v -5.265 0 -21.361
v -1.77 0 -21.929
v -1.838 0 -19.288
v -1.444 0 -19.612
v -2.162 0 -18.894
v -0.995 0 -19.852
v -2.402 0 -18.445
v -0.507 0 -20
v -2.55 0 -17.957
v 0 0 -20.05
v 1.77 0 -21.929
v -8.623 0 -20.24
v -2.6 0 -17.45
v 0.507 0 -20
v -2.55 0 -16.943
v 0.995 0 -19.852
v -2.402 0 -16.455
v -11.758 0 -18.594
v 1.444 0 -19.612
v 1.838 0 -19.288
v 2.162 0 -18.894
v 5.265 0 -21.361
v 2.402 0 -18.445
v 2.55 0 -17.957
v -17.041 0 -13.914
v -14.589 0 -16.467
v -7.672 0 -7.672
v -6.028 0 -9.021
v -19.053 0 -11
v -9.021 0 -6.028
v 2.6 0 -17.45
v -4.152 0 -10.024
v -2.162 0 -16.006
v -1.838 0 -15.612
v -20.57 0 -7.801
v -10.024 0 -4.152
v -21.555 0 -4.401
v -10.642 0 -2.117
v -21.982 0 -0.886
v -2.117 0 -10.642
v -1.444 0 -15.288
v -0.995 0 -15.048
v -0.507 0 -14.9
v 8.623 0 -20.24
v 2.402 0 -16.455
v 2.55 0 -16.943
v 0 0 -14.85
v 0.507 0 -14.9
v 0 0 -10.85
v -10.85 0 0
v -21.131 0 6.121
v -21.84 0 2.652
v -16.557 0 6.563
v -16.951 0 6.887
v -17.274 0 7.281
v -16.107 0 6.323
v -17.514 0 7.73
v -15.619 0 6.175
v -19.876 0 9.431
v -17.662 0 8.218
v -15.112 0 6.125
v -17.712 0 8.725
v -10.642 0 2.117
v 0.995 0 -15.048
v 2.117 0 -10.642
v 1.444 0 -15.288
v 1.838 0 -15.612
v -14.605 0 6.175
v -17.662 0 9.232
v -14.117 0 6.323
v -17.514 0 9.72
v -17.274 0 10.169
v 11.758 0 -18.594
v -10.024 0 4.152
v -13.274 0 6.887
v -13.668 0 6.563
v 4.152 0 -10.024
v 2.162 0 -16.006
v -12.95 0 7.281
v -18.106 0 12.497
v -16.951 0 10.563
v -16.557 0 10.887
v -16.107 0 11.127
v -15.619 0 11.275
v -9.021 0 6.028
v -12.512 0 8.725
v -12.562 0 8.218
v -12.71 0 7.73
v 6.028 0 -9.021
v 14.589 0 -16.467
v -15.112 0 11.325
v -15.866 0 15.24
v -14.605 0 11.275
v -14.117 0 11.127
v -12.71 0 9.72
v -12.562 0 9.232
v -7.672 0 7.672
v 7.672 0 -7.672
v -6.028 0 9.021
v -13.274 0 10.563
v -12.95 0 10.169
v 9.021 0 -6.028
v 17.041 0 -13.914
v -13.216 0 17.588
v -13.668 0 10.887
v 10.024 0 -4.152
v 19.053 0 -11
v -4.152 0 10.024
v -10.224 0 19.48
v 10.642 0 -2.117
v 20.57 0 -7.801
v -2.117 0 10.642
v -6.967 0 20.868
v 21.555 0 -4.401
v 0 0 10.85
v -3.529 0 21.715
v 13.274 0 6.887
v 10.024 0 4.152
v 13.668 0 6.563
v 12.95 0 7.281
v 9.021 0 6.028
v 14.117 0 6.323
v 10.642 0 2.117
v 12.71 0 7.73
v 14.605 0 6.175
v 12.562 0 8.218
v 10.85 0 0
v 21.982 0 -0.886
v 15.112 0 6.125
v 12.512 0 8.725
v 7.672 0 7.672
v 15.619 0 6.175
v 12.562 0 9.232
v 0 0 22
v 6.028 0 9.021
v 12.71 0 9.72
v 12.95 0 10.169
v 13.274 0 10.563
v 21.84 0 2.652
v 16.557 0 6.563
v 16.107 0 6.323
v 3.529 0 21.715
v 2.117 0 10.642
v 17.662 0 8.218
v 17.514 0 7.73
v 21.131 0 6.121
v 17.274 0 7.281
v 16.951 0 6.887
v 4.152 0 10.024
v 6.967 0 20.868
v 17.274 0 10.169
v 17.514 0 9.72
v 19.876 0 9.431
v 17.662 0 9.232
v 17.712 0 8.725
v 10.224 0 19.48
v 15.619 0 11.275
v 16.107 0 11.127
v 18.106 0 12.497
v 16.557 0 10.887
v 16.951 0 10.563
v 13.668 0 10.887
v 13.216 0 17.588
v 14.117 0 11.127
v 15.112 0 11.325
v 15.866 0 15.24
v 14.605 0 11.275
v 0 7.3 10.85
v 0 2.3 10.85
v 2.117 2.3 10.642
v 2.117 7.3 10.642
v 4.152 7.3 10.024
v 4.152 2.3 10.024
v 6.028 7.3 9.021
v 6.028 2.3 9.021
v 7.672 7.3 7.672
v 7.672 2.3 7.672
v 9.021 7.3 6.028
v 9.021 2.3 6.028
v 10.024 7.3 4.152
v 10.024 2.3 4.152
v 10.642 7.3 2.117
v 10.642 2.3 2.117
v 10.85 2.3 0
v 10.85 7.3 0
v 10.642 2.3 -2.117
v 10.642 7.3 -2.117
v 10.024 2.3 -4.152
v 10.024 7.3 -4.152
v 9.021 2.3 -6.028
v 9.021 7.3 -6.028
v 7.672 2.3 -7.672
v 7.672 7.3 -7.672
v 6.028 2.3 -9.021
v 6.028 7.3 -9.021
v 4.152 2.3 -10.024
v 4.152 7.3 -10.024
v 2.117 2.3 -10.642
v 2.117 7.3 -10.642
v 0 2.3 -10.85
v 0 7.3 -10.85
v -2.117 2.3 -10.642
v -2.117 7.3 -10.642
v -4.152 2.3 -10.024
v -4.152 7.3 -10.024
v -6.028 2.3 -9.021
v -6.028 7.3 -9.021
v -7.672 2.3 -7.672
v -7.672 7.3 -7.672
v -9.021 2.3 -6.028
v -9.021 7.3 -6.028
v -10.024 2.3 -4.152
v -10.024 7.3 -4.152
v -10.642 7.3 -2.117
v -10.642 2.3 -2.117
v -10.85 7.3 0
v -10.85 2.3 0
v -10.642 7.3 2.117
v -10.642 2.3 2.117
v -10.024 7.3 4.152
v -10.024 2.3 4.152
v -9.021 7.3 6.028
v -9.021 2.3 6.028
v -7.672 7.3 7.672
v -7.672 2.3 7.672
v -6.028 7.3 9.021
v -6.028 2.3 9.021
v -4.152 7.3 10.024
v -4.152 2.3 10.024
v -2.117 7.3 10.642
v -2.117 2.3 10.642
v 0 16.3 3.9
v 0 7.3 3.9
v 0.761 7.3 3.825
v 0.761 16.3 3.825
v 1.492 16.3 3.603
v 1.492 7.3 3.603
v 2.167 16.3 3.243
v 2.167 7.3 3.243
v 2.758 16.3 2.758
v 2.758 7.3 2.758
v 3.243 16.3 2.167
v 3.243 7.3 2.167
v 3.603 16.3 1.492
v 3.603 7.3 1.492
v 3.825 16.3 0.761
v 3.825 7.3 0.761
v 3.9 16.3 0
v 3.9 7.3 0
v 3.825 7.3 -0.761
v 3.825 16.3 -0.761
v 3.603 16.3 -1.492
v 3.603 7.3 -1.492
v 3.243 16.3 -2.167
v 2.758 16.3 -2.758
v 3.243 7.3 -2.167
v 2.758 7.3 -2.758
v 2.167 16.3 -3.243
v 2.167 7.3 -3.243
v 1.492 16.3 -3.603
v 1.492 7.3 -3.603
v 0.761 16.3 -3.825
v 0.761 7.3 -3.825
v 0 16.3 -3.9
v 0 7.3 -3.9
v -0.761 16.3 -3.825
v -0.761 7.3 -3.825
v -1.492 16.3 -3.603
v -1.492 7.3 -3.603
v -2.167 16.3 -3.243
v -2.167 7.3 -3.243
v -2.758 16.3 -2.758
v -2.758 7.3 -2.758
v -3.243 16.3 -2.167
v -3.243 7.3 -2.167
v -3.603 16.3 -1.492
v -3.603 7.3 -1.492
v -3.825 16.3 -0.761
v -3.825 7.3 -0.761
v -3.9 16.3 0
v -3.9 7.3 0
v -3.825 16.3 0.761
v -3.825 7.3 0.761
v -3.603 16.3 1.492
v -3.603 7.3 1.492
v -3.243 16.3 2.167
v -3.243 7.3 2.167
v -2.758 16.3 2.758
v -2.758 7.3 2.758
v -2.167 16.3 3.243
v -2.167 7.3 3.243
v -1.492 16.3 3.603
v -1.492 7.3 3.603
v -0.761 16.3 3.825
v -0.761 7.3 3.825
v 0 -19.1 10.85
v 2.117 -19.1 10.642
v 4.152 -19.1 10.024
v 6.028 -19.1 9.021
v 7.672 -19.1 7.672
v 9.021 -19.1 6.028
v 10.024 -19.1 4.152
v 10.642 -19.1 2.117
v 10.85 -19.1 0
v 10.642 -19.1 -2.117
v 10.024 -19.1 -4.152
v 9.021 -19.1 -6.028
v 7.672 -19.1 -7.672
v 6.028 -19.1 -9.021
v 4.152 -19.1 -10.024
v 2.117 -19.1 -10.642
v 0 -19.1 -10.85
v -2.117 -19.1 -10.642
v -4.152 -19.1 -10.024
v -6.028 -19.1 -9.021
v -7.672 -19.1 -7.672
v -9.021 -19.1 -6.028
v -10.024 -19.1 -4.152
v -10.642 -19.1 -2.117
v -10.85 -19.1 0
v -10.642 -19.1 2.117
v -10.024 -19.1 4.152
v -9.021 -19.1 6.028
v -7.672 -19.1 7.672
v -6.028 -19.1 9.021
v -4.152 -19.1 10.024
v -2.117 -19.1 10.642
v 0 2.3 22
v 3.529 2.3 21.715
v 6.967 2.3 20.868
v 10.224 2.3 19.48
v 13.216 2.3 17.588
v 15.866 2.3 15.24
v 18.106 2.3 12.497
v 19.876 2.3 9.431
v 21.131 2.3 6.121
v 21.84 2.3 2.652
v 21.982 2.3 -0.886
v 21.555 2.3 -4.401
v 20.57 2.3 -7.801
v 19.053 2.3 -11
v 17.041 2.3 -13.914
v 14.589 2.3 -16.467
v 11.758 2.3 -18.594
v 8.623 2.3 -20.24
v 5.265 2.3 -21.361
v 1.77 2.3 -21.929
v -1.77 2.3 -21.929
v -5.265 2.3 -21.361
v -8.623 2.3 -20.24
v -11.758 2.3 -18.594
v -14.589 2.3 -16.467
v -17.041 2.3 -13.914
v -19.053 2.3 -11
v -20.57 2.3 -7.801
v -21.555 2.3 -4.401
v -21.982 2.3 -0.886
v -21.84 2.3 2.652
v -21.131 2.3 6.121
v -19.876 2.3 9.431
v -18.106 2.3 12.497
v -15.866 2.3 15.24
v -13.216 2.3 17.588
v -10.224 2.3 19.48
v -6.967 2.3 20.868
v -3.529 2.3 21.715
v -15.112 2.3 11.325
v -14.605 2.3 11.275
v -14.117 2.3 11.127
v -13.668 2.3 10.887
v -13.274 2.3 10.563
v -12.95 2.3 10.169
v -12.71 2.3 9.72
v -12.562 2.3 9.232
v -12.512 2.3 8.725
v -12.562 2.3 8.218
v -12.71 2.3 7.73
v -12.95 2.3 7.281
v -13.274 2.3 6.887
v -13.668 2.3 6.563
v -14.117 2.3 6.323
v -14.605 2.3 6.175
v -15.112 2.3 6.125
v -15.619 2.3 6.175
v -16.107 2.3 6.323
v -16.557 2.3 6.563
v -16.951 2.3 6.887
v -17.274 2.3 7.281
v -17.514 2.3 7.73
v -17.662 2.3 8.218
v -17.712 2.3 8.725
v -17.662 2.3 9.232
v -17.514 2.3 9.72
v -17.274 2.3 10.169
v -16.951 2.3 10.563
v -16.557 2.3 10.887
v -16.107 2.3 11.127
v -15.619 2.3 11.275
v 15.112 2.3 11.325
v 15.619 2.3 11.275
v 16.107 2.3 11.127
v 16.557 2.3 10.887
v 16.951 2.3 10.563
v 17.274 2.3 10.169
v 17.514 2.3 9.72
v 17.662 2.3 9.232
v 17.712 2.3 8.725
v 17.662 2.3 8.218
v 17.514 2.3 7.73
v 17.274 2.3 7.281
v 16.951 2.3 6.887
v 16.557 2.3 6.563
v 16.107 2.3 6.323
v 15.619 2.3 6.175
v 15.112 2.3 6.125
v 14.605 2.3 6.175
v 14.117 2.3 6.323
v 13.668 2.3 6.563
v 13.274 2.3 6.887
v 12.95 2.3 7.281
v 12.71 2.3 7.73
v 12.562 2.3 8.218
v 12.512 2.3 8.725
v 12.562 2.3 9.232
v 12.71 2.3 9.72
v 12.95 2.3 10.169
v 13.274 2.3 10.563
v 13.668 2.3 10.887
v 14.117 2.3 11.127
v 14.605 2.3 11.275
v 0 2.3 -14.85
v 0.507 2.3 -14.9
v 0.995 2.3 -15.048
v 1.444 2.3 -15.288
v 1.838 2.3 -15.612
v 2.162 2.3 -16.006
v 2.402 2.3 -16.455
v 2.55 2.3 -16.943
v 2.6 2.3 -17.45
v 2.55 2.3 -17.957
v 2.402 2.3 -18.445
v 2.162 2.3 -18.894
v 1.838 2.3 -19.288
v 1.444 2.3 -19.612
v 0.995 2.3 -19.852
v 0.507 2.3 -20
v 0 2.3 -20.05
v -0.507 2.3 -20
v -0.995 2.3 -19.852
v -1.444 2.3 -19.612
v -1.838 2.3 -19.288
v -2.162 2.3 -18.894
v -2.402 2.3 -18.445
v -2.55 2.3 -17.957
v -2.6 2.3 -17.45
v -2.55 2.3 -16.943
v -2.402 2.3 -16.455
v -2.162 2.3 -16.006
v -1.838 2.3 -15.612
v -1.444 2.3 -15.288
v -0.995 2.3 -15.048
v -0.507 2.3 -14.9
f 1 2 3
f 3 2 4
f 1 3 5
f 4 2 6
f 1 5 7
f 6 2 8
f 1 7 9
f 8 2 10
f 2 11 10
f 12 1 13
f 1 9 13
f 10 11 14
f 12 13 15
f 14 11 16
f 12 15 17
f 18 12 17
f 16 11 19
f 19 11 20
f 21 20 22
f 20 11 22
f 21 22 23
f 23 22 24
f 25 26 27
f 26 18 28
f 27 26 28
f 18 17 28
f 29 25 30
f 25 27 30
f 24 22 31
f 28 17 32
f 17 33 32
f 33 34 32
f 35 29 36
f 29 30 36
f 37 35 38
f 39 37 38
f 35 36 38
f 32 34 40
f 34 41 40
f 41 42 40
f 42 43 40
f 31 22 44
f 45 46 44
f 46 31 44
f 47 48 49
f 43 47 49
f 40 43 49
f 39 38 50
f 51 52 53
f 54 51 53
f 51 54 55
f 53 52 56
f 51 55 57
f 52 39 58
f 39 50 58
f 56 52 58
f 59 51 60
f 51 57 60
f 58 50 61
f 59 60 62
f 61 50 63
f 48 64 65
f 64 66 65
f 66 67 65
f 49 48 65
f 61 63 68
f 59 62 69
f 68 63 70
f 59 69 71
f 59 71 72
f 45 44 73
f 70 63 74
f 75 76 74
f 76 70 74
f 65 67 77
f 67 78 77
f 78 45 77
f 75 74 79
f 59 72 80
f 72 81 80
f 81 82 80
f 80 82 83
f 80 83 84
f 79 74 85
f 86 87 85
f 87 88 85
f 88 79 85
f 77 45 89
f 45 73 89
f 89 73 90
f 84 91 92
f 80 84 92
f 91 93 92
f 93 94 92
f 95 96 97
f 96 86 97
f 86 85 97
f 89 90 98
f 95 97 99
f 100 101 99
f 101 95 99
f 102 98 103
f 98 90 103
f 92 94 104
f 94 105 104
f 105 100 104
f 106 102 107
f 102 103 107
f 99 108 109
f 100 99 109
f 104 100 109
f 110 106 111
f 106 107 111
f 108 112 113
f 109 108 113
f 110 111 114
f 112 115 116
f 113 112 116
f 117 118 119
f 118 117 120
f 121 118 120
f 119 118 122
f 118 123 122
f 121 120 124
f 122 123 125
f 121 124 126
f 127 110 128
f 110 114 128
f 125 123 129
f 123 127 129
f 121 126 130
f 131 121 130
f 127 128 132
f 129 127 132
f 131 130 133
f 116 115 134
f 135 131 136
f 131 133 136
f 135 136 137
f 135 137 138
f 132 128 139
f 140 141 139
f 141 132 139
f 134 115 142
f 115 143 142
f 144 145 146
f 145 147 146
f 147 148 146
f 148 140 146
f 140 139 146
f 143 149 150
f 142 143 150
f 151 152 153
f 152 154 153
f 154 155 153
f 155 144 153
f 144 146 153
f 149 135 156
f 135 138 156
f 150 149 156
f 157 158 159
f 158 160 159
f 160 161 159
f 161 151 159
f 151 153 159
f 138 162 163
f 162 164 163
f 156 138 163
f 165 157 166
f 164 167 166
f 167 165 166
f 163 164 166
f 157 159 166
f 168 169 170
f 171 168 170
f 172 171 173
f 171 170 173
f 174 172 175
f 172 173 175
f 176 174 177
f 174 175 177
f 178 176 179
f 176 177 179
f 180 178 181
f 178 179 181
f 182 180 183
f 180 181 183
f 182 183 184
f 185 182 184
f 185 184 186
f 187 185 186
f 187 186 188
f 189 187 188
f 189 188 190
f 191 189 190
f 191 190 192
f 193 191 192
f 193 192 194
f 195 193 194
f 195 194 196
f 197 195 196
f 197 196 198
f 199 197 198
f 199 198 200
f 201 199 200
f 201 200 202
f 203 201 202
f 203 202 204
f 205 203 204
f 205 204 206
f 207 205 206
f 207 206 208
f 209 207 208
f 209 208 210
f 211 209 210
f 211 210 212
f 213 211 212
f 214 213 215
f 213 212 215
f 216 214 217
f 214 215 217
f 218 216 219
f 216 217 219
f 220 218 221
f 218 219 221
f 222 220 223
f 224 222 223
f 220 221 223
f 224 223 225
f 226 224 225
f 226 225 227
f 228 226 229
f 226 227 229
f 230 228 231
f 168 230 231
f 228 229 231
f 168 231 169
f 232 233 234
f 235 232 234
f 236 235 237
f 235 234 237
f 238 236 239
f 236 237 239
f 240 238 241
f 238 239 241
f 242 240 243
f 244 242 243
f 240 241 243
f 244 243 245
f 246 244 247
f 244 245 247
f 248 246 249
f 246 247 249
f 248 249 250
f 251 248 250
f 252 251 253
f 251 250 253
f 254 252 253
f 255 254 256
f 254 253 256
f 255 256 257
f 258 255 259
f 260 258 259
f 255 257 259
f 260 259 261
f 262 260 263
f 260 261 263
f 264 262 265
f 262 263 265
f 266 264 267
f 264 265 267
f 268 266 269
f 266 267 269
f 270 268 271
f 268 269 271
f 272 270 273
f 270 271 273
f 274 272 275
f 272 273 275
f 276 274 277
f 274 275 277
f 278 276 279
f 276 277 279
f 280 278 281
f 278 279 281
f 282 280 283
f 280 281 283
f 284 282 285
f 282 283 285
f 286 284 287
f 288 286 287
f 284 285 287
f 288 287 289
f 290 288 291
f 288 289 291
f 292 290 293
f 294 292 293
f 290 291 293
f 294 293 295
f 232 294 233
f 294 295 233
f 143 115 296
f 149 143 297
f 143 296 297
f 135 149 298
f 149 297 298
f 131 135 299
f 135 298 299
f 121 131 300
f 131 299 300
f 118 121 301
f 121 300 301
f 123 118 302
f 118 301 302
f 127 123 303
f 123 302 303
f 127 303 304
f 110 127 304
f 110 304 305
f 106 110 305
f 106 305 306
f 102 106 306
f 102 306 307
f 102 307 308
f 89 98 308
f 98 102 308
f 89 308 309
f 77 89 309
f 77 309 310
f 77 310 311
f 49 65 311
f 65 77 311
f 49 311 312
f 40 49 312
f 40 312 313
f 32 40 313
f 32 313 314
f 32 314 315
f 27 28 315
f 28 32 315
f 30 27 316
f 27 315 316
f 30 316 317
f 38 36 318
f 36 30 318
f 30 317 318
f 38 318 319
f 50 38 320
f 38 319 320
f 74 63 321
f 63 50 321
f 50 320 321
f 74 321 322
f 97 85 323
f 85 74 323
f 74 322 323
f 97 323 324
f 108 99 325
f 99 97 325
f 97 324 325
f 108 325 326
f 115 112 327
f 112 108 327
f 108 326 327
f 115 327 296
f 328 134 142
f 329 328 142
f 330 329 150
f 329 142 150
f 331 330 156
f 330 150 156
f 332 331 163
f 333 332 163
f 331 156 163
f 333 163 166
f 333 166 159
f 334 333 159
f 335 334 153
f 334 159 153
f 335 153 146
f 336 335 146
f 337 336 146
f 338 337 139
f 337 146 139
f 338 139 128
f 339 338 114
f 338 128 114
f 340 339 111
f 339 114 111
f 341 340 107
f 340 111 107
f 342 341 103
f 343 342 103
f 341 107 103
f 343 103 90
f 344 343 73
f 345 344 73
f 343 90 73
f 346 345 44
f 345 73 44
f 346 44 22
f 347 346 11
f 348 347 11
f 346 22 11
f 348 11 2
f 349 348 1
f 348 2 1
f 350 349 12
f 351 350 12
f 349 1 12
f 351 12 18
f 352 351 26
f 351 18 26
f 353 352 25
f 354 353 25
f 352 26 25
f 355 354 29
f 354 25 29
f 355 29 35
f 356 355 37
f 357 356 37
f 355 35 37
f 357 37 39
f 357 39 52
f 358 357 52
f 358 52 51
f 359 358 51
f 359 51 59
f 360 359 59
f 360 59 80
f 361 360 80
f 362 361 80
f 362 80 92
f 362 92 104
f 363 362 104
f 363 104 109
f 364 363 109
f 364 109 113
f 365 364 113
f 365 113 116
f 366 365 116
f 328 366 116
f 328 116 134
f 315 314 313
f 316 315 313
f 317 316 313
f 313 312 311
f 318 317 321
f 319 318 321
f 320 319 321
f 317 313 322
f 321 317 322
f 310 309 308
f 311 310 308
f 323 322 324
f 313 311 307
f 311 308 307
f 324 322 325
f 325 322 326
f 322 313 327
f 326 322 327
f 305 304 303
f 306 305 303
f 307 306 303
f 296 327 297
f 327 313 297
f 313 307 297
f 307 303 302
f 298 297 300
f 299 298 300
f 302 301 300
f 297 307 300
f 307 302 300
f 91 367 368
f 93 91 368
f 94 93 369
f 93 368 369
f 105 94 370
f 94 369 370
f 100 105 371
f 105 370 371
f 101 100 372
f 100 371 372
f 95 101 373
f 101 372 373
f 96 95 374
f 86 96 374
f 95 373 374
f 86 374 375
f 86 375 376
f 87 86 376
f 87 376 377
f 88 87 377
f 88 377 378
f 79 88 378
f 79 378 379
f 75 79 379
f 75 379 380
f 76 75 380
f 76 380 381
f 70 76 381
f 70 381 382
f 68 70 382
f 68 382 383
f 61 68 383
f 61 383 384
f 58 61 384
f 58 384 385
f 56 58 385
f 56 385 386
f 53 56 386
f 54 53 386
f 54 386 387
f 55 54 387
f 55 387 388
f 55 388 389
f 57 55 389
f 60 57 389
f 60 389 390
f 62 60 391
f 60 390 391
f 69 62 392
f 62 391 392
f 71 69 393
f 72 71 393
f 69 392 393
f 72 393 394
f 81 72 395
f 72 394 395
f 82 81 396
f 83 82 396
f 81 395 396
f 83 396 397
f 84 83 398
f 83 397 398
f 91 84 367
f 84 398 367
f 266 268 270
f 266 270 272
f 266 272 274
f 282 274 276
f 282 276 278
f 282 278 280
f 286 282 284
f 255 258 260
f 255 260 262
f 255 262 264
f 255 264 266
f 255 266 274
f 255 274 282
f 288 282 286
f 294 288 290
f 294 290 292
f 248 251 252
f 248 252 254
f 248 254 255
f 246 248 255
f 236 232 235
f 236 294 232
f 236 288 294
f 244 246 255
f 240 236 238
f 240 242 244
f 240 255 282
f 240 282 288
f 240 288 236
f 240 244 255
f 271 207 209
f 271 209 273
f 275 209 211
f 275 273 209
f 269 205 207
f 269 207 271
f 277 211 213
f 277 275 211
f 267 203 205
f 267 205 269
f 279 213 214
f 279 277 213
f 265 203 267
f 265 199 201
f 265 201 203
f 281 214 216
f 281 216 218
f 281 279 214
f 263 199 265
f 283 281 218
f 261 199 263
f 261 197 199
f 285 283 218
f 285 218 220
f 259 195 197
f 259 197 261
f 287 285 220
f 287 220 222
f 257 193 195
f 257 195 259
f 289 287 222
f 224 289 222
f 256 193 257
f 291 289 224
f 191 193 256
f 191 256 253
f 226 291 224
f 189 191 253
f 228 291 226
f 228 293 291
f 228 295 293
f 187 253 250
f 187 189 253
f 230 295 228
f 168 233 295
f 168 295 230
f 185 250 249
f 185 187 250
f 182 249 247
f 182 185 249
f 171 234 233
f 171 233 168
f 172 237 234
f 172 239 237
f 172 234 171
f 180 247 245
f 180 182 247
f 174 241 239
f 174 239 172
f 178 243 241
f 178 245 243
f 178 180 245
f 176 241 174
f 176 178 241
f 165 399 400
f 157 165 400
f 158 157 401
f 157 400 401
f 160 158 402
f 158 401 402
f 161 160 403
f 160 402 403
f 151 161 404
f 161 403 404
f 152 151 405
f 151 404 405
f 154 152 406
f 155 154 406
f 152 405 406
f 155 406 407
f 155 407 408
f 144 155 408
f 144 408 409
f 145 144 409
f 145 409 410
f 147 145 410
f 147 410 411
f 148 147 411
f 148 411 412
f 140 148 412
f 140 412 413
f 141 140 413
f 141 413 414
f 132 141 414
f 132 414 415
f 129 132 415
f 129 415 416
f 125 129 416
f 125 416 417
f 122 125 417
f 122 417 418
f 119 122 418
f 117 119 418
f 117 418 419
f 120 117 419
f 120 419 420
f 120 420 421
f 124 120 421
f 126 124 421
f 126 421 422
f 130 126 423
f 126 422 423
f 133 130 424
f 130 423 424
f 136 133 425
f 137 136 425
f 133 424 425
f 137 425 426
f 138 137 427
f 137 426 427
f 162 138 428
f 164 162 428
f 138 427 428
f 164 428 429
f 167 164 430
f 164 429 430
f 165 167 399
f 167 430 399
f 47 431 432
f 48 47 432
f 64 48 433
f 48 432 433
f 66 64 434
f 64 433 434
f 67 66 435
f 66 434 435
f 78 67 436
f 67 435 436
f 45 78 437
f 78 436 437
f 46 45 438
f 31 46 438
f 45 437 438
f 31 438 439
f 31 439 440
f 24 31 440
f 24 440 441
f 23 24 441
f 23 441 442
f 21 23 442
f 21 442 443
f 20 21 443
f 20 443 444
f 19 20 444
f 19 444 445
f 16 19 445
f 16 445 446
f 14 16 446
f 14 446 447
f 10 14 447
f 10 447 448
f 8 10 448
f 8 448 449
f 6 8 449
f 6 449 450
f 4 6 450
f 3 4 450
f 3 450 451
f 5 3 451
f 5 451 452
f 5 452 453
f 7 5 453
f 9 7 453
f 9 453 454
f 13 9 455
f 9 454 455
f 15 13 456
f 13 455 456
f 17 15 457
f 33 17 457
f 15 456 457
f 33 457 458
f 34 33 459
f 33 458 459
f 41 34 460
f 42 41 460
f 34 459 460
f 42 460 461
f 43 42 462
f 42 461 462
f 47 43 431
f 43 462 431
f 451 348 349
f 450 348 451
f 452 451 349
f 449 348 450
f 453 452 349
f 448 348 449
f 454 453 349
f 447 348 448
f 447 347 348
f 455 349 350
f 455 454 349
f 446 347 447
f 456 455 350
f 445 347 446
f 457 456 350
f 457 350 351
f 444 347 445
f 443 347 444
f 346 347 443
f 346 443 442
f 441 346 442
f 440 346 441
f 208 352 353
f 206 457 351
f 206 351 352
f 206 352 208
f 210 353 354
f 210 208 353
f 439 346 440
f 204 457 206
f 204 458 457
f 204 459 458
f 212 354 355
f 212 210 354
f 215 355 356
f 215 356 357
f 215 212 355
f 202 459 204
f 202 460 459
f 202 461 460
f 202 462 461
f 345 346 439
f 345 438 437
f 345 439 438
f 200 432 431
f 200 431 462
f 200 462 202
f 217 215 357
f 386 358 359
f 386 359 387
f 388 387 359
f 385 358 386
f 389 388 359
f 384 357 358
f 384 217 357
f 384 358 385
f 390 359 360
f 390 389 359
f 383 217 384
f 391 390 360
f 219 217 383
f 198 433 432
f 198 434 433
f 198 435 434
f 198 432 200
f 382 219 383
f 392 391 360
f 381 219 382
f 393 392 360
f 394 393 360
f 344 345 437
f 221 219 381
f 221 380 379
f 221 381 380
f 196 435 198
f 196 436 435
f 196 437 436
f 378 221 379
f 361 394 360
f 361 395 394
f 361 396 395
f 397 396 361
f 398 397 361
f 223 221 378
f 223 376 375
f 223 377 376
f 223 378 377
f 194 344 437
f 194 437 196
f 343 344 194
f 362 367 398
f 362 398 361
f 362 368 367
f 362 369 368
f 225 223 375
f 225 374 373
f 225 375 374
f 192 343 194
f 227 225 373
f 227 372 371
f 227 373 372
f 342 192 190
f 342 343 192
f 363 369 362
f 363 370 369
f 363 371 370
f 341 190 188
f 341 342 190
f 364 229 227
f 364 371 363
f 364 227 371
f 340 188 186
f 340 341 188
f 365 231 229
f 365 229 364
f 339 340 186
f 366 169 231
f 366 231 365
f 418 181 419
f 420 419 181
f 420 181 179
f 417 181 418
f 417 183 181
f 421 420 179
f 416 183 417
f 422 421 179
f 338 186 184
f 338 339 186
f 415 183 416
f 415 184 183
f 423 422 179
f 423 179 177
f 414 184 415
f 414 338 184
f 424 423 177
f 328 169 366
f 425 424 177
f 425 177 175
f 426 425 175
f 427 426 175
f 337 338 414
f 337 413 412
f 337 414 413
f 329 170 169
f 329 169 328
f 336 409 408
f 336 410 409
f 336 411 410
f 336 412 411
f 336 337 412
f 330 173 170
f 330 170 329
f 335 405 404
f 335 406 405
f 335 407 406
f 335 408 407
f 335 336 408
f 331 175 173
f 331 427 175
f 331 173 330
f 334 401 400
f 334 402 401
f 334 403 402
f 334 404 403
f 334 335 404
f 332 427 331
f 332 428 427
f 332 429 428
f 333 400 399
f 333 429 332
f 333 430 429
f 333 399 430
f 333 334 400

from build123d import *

# Parameters (mm, degrees)
SKETCH1_R                = 22
BOSS_EXTRUDE1_DEPTH      = 2.3
BOSS_EXTRUDE2_DEPTH      = 5
BOSS_EXTRUDE2_DEPTH_BACK = 21.4
SKETCH2_R                = 10.85
SKETCH3_R                = 3.9
BOSS_EXTRUDE3_DEPTH      = 9
SKETCH4_R                = 2.6
CUT_EXTRUDE1_DEPTH       = 38.761885546


with BuildPart() as part:
    # Sketch1 → Boss-Extrude1 (new body)
    with BuildSketch(Plane(origin=(0, 0, 0), x_dir=(1, 0, 0), z_dir=(0, 1, 0))):
        with Locations(Location((0, 0, 0), (0, 0, 270))):
            Circle(SKETCH1_R)
    extrude(amount=BOSS_EXTRUDE1_DEPTH)

    # Sketch2 → Boss-Extrude2 (add, two sides: drawn at the far end of the back side and taken through both)
    with BuildSketch(Plane(origin=(0, 2.3, 0), x_dir=(1, 0, 0), z_dir=(0, 1, 0)).offset(-BOSS_EXTRUDE2_DEPTH_BACK)):
        with Locations(Location((0, 0, 0), (0, 0, 270))):
            Circle(SKETCH2_R)
    extrude(amount=BOSS_EXTRUDE2_DEPTH + BOSS_EXTRUDE2_DEPTH_BACK)

    # Sketch3 → Boss-Extrude3 (add)
    with BuildSketch(Plane(origin=(0, 7.3, 0), x_dir=(1, 0, 0), z_dir=(0, 1, 0))):
        with Locations(Location((0, 0, 0), (0, 0, 270))):
            Circle(SKETCH3_R)
    extrude(amount=BOSS_EXTRUDE3_DEPTH)

    # Sketch4 → Cut-Extrude1 (cut, through all)
    with BuildSketch(Plane(origin=(0, 2.3, 0), x_dir=(1, 0, 0), z_dir=(0, 1, 0))):
        with Locations(Location((0, 17.45, 0), (0, 0, 270))):
            Circle(SKETCH4_R)
        with Locations(Location((-15.112143296, -8.725, 0), (0, 0, 270))):
            Circle(SKETCH4_R)
        with Locations(Location((15.112143296, -8.725, 0), (0, 0, 270))):
            Circle(SKETCH4_R)
    extrude(amount=-CUT_EXTRUDE1_DEPTH, mode=Mode.SUBTRACT)


solid = part.part
